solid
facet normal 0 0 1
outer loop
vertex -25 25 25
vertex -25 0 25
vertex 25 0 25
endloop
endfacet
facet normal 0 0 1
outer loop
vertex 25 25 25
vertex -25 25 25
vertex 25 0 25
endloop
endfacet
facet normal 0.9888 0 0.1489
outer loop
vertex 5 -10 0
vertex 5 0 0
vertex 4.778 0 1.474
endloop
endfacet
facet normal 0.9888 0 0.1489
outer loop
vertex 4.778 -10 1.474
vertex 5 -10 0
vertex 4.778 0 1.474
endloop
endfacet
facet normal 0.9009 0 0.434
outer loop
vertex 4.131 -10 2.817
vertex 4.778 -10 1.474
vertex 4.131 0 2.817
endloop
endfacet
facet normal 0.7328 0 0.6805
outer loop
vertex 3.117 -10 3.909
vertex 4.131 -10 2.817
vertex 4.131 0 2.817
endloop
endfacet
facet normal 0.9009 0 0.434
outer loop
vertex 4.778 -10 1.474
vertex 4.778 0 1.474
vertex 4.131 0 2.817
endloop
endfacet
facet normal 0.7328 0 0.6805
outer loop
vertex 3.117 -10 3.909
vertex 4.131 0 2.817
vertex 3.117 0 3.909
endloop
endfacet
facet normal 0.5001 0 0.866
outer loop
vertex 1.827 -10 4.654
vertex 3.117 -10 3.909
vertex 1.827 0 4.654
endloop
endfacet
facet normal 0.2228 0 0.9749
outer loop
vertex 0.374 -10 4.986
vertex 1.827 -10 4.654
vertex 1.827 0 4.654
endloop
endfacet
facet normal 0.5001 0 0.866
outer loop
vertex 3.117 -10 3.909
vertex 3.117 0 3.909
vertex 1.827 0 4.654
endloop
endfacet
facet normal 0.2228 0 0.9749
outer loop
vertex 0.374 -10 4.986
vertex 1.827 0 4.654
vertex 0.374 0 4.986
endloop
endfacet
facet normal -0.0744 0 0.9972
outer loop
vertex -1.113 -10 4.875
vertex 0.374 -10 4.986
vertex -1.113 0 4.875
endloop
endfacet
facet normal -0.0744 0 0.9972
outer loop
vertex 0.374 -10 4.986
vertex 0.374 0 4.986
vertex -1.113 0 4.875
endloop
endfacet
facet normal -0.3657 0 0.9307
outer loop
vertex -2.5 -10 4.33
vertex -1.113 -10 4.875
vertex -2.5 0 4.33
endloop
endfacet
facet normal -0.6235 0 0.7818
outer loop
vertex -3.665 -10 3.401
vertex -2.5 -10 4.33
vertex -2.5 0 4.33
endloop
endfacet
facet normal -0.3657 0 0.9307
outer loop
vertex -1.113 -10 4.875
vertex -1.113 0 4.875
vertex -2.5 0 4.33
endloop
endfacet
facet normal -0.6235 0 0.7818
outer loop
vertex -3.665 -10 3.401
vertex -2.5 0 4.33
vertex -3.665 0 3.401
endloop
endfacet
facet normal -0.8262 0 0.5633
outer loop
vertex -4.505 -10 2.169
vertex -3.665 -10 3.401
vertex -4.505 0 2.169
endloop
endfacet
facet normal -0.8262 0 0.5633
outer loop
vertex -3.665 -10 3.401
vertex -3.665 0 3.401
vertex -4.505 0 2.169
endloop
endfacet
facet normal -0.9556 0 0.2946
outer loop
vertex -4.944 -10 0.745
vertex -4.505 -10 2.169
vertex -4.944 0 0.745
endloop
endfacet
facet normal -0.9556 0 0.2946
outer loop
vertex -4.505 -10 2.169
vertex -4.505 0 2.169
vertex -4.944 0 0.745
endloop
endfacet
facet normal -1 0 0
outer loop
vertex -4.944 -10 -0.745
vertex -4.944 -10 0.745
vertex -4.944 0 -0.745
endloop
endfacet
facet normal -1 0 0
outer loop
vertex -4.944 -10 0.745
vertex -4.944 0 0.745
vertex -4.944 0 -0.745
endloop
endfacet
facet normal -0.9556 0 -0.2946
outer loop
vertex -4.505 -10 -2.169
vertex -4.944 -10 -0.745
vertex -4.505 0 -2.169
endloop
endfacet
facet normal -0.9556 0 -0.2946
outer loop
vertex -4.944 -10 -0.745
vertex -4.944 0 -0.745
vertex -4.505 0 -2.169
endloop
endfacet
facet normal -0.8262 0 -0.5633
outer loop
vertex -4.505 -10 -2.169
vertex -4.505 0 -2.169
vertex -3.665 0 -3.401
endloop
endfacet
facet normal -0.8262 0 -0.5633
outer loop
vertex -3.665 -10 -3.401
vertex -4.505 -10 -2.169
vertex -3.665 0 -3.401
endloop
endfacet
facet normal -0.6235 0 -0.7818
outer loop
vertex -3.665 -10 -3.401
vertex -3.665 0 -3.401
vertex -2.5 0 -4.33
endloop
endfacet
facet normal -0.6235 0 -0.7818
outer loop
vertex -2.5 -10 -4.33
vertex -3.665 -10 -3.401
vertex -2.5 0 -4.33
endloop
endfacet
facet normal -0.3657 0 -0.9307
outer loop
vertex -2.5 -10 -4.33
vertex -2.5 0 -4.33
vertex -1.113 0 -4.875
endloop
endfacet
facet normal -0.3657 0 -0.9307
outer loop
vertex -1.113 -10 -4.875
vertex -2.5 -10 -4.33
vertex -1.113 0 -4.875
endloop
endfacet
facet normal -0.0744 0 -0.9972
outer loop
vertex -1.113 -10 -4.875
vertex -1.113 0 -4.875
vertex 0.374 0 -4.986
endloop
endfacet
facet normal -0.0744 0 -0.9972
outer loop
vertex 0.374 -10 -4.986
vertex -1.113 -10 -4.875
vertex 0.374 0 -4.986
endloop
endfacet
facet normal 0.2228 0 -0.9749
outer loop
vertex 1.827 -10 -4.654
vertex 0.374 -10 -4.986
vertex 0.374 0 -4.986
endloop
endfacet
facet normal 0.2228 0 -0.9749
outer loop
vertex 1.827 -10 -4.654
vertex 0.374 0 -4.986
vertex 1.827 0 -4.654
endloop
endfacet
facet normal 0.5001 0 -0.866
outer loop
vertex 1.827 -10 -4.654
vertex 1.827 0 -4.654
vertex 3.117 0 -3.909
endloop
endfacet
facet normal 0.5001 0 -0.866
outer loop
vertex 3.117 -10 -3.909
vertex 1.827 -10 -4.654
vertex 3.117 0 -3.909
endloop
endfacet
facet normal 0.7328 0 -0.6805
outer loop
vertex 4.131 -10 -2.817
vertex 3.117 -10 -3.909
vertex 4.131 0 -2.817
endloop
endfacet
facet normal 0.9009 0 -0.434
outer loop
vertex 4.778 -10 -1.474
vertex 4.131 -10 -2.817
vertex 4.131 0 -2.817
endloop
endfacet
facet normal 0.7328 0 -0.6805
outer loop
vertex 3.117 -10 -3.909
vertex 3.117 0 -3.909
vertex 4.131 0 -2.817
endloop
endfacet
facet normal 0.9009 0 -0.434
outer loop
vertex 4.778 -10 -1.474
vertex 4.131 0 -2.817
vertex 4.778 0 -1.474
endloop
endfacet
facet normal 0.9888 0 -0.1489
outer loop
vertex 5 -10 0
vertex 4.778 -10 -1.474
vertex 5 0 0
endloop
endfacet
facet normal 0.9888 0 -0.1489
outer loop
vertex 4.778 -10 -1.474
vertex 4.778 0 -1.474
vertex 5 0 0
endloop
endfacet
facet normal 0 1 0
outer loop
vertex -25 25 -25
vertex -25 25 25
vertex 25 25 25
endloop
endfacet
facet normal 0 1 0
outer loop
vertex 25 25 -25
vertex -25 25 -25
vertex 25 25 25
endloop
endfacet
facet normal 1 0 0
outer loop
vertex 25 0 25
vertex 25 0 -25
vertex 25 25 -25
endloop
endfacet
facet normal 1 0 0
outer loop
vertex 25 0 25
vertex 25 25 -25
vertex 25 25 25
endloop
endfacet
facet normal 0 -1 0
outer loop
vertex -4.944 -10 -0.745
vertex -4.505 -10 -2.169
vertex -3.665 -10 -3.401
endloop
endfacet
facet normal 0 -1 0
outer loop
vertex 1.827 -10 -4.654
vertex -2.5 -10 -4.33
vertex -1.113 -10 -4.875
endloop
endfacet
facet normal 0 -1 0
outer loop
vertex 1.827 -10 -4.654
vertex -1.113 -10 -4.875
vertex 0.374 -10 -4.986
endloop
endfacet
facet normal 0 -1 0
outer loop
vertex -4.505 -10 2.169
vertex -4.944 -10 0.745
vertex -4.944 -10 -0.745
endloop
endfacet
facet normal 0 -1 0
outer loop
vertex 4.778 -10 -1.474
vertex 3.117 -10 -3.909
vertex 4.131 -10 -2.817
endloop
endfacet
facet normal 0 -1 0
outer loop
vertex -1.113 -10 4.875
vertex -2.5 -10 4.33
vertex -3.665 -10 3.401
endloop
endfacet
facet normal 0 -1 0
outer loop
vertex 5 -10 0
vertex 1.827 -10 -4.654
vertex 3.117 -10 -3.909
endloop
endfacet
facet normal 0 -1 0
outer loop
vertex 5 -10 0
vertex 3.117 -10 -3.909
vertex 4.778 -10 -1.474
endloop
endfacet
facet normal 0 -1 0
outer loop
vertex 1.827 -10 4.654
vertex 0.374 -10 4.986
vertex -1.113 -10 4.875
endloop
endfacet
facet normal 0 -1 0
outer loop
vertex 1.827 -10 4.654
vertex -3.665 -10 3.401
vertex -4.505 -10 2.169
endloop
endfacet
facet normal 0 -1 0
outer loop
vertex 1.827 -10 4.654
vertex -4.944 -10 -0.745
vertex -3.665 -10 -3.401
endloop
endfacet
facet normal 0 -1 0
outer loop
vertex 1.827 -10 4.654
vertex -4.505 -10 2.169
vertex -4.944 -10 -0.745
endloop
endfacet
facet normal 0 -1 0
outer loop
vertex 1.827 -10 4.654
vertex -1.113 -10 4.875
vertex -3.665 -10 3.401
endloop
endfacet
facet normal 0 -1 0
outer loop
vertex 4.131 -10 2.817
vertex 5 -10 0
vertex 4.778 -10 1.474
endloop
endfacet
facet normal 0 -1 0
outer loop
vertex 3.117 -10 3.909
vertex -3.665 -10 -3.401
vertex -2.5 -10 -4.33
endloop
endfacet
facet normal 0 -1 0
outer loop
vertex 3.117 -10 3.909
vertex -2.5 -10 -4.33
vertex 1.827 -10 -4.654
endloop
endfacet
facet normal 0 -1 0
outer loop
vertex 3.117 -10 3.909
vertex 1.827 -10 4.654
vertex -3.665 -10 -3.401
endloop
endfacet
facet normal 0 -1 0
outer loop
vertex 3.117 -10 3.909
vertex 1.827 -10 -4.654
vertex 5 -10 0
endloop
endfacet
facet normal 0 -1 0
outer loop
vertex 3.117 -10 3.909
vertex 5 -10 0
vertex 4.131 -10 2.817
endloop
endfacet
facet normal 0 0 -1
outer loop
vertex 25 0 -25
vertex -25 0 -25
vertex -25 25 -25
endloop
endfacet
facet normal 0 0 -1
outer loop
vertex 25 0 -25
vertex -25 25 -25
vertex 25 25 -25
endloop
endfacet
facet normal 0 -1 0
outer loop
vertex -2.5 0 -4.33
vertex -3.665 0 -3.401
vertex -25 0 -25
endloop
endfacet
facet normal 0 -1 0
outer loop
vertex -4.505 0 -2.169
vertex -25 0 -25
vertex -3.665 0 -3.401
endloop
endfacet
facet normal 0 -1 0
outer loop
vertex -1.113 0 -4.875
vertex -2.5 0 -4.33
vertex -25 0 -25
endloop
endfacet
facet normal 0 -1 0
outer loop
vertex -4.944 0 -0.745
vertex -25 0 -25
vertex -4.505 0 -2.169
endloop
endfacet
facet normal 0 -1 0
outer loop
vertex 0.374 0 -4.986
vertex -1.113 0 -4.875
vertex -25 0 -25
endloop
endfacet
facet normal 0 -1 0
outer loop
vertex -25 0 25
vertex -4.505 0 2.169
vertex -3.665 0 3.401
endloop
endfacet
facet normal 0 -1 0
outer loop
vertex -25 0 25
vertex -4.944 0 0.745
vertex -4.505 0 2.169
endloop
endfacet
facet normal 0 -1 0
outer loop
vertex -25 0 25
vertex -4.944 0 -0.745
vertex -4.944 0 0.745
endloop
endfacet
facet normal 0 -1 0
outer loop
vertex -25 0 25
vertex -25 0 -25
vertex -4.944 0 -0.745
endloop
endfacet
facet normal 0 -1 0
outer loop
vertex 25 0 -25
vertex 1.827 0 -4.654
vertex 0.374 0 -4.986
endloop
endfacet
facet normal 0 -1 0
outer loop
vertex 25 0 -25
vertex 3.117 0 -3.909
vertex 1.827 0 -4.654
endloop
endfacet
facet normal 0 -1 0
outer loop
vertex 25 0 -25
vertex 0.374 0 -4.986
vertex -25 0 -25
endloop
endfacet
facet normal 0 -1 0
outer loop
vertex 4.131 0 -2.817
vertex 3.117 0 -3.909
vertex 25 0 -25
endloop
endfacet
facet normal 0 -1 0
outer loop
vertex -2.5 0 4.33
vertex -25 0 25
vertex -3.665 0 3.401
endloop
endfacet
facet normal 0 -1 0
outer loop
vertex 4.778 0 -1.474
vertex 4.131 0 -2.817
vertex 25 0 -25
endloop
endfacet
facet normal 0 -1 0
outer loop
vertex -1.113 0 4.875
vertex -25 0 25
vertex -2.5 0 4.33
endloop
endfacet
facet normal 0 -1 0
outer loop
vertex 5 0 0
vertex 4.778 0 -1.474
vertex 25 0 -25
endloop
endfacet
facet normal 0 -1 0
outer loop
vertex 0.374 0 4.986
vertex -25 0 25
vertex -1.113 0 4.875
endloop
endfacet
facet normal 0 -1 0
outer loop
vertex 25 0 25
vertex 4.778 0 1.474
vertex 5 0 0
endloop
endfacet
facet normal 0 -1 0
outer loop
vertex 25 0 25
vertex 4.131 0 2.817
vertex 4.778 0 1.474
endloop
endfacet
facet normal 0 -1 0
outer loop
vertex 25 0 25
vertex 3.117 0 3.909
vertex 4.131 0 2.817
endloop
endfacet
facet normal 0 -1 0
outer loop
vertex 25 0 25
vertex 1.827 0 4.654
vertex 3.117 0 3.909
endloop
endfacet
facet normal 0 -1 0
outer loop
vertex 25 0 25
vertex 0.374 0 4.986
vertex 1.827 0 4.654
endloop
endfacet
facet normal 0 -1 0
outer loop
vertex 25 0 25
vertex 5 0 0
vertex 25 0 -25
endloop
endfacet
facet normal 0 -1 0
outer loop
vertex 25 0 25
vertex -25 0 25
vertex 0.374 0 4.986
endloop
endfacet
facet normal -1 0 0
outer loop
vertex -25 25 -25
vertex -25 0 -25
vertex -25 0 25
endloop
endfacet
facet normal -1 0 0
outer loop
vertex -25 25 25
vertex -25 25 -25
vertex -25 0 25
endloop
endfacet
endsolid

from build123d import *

# Parameters (mm, degrees)
F0_W     = 50
F0_H     = 50
F1_DEPTH = 25
F2_R     = 5
F3_DEPTH = 10


with BuildPart() as f1:
    # F0 (on Front) → F1 (new body)
    with BuildSketch(Plane.XZ):
        Rectangle(F0_W, F0_H)
    extrude(amount=-F1_DEPTH)

    # F2 (on face) → F3 (join)
    with BuildSketch(Plane.XZ):
        Circle(F2_R)
    extrude(amount=F3_DEPTH)


solid = f1.part
